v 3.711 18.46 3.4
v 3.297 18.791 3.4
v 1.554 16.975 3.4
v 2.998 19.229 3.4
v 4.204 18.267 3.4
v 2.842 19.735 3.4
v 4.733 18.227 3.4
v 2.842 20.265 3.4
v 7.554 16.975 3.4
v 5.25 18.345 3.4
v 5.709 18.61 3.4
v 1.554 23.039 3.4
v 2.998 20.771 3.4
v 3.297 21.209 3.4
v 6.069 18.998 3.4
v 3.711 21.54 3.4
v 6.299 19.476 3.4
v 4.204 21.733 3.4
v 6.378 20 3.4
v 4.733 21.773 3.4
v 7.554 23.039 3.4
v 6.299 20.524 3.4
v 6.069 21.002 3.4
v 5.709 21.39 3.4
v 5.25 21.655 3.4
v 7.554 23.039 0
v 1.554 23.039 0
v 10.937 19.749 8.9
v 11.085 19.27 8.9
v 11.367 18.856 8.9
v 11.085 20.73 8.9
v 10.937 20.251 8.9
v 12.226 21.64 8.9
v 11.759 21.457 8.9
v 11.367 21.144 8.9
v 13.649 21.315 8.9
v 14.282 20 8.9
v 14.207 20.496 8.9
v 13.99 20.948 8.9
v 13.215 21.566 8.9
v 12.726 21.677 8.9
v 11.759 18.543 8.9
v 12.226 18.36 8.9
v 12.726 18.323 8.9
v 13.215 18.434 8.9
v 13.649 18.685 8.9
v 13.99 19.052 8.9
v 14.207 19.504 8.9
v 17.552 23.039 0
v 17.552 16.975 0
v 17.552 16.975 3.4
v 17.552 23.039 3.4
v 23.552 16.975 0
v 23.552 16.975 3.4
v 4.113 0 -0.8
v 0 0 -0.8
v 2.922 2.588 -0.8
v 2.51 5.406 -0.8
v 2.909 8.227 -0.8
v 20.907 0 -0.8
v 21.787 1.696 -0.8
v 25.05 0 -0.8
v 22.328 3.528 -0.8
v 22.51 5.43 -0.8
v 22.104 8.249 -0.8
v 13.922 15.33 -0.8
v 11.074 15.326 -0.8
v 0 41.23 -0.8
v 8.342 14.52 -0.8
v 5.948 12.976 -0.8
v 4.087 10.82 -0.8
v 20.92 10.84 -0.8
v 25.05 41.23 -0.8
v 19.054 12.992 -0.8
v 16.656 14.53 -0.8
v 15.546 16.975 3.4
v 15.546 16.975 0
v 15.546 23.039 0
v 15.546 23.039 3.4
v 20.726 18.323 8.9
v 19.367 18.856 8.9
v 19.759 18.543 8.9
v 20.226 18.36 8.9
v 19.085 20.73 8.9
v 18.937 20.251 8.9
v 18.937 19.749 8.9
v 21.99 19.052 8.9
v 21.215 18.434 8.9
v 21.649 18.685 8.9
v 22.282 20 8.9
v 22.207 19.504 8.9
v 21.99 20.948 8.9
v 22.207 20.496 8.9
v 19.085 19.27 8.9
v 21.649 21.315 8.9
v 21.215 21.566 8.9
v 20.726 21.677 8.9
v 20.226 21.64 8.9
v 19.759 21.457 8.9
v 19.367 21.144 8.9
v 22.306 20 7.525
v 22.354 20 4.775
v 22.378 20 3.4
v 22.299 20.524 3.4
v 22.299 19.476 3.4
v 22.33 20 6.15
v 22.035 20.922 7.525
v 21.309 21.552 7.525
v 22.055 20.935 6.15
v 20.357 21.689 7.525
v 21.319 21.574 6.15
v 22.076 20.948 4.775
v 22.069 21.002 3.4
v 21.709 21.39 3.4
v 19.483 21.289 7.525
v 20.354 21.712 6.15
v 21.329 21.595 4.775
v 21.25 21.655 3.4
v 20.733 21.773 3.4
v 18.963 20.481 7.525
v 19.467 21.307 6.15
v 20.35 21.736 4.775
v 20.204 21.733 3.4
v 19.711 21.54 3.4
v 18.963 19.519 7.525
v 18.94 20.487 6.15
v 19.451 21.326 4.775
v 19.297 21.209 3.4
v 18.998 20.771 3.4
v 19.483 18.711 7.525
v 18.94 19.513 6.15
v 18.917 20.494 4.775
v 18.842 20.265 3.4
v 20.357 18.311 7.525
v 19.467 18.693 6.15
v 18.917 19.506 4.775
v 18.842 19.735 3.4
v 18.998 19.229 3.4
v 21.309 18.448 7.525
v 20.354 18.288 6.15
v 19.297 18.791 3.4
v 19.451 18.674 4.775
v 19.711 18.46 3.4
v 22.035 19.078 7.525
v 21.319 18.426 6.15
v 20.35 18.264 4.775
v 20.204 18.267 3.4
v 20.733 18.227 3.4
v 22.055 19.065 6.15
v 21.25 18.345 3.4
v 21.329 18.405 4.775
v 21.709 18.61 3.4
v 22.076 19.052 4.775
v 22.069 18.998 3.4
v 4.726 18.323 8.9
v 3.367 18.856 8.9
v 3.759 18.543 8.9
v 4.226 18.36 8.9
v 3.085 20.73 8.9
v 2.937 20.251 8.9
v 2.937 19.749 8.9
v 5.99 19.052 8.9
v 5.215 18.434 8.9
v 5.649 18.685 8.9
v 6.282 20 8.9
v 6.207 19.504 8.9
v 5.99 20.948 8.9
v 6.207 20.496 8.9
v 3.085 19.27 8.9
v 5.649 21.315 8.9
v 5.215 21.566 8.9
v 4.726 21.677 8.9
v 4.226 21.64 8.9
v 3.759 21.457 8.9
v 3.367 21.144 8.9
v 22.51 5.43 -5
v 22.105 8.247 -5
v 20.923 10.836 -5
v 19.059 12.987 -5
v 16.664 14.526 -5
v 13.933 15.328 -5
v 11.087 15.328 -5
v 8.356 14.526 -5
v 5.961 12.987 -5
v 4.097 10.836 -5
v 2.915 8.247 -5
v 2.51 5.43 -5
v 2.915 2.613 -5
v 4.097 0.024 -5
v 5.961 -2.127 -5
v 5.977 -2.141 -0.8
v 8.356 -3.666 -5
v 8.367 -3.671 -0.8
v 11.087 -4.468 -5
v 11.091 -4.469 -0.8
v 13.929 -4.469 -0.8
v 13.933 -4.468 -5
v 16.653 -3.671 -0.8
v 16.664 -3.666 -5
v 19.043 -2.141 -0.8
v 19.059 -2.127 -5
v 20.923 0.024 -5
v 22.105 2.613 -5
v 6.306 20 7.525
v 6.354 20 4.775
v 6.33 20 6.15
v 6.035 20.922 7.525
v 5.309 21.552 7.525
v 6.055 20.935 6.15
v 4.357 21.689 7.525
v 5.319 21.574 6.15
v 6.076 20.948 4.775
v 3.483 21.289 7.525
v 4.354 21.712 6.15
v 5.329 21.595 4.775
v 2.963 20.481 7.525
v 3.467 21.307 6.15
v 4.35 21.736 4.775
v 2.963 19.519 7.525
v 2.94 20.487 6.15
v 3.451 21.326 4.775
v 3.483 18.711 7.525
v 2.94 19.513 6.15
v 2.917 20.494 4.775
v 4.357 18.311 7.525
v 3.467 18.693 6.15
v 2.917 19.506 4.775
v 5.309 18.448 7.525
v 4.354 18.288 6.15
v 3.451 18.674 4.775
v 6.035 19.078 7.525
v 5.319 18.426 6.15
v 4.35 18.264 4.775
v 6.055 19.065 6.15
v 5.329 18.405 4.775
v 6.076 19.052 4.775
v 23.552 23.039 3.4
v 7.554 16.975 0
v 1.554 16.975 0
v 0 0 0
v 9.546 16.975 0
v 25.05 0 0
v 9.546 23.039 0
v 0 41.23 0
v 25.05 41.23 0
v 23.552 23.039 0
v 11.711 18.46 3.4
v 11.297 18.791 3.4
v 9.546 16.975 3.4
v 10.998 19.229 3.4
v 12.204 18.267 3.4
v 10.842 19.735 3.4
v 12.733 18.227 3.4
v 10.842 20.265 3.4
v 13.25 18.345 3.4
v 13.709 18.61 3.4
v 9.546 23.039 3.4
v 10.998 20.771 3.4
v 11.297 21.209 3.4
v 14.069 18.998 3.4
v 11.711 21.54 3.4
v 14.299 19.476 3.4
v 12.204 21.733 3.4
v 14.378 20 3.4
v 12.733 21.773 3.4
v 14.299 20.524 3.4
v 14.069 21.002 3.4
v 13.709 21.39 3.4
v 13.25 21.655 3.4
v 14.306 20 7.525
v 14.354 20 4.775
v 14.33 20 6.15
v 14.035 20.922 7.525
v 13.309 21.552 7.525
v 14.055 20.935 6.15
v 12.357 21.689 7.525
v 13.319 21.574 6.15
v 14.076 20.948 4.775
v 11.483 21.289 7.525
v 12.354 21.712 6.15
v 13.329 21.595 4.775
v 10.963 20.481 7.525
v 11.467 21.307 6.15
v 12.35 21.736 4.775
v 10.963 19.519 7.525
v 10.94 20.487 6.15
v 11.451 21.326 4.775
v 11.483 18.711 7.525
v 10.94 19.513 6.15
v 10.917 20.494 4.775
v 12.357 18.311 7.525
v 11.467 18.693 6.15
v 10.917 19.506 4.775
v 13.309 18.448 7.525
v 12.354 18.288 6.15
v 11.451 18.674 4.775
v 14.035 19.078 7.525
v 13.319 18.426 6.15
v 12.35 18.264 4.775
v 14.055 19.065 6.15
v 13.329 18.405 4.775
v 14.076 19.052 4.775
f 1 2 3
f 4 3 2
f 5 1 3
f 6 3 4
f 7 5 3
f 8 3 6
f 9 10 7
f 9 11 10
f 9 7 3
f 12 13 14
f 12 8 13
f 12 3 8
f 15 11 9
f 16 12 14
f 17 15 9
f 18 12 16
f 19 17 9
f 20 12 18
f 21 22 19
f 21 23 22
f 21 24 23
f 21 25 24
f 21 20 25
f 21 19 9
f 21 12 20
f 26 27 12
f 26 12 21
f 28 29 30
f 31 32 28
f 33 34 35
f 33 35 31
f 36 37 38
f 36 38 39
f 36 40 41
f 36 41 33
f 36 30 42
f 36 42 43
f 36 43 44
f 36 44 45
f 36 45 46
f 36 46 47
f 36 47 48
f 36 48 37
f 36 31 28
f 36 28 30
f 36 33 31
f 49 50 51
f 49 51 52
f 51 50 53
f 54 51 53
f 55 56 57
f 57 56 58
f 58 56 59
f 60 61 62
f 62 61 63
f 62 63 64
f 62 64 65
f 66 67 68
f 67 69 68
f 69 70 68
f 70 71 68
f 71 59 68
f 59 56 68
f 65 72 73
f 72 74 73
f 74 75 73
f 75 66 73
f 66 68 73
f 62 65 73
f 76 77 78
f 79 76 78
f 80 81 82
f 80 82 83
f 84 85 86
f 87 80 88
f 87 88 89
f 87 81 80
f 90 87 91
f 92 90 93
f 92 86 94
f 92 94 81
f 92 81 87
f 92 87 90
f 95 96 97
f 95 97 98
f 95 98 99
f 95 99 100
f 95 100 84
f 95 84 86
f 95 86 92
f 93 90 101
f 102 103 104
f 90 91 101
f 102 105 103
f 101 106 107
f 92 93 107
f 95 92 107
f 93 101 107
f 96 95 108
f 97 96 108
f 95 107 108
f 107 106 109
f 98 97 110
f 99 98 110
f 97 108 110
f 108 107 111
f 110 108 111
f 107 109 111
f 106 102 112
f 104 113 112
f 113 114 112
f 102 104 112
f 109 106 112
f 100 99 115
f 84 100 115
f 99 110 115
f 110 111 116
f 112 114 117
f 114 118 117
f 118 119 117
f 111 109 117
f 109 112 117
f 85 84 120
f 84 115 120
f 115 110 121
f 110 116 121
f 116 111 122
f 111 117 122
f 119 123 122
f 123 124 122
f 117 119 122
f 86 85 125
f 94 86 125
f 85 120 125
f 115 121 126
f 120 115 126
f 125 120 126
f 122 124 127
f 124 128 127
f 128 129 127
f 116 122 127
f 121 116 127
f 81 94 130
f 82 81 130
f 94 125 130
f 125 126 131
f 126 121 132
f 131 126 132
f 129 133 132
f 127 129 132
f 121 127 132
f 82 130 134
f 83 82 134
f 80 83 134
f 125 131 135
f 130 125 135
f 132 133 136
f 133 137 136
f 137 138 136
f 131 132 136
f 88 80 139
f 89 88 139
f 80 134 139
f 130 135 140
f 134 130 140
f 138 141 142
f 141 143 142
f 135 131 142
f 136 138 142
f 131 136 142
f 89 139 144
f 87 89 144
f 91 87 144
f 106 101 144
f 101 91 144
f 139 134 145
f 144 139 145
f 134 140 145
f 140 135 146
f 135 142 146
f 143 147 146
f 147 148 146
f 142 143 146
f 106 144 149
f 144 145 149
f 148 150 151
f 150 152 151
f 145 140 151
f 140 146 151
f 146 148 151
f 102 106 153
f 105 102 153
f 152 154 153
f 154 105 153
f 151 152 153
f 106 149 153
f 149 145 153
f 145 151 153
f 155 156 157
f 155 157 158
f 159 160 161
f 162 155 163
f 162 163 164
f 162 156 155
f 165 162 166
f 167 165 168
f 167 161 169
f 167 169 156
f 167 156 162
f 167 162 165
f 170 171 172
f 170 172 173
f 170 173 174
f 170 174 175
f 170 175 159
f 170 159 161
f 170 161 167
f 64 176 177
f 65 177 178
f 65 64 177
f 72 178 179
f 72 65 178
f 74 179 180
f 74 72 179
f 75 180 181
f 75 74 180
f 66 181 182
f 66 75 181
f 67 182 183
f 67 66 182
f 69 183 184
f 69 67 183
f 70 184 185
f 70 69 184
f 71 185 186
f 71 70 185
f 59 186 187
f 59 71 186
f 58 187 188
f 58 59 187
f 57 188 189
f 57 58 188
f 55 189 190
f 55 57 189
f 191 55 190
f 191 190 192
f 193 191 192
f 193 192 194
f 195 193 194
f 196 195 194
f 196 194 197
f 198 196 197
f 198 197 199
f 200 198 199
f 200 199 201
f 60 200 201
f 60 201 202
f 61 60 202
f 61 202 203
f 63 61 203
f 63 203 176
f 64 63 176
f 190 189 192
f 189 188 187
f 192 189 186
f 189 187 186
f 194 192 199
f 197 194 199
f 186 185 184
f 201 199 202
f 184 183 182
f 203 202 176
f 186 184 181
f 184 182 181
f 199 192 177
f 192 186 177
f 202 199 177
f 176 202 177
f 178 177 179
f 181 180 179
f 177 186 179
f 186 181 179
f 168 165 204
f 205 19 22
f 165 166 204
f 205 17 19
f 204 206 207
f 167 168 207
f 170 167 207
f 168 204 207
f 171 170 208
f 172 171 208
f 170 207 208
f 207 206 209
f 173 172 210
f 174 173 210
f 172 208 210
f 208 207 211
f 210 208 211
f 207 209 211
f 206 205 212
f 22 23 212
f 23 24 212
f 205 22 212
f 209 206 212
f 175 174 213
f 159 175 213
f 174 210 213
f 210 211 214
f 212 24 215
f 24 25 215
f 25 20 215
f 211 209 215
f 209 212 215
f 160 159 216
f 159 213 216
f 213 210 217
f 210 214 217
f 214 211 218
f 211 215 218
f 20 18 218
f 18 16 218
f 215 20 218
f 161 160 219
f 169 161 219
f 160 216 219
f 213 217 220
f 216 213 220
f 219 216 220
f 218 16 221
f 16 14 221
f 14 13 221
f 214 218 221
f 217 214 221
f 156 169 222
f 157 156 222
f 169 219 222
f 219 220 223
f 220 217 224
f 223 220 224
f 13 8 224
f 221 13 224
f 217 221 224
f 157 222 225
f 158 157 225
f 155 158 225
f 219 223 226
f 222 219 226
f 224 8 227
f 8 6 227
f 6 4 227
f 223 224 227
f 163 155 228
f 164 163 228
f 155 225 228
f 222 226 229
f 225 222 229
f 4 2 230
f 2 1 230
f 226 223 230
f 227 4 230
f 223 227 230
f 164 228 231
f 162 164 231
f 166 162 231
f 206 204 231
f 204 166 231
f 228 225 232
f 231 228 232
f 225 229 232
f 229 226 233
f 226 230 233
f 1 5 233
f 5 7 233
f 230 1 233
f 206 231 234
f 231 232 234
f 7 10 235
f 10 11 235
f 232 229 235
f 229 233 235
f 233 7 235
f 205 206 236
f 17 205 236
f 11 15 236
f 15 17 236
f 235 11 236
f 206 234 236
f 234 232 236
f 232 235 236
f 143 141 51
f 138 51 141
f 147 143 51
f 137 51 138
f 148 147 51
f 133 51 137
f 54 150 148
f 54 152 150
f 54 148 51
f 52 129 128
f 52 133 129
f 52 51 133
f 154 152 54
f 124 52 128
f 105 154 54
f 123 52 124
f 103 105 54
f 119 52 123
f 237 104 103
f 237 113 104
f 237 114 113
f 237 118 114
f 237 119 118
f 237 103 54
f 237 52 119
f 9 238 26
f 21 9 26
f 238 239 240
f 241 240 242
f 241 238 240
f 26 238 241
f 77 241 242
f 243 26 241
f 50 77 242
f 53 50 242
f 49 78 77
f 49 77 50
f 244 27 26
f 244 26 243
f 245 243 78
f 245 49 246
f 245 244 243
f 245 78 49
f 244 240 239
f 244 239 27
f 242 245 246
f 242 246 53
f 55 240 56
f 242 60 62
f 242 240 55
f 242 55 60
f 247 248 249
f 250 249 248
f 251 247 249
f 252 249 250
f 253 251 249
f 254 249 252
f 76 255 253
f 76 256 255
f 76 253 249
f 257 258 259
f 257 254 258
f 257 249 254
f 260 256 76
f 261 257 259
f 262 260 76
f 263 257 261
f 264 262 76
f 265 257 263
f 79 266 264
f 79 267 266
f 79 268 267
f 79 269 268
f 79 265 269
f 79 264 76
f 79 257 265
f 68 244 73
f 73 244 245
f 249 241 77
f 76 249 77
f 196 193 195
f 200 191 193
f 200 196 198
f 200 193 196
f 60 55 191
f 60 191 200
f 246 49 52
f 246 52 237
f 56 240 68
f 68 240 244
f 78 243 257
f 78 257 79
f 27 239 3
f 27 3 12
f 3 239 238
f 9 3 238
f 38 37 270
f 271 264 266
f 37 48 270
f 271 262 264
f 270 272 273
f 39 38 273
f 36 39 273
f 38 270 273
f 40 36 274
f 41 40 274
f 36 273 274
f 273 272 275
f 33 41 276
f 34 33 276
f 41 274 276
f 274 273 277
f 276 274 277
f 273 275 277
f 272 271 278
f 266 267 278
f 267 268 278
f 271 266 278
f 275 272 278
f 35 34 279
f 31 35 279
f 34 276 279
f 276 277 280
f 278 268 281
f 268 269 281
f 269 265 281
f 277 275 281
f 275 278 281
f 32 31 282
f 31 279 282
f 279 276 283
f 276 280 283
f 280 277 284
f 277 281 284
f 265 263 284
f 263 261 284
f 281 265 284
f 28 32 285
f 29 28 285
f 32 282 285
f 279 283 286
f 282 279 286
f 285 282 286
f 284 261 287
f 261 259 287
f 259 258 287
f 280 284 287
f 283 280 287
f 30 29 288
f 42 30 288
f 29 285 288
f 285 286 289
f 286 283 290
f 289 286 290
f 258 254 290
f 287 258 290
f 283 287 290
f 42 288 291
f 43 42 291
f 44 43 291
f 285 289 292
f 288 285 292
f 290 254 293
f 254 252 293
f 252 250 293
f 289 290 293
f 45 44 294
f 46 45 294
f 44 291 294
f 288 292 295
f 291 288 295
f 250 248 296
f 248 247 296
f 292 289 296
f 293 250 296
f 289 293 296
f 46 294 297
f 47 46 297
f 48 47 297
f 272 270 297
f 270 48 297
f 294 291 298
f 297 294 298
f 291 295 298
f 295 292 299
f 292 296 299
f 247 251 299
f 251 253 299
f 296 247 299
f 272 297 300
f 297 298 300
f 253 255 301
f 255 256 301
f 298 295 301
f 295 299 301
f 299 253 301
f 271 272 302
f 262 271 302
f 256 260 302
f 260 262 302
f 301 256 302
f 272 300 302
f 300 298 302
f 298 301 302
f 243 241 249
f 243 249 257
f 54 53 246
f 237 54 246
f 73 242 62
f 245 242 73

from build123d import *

# Parameters (mm, degrees)
SKETCH_20_W                   = 25.05
SKETCH_20_H                   = 41.23
BOSS_EXTRUDE1_DEPTH           = 0.8
SKETCH13_W                    = 6
SKETCH13_H                    = 6.063806384
BOSS_EXTRUDE2_DEPTH           = 3.4
SKETCH14_R                    = 1.778
BOSS_EXTRUDE3_DEPTH           = 5.5
BOSS_EXTRUDE3_DRAFT           = 1
BOSS_EXTRUDE3_PROFILE_2_DEPTH = 5.5
BOSS_EXTRUDE3_PROFILE_2_DRAFT = 1
BOSS_EXTRUDE3_PROFILE_3_DEPTH = 5.5
BOSS_EXTRUDE3_PROFILE_3_DRAFT = 1
SKETCH15_R                    = 10
BOSS_EXTRUDE4_DEPTH           = 4.2


with BuildPart() as part:
    # Sketch 20 → Boss-Extrude1 (new body)
    with BuildSketch(Plane.XY):
        with Locations((12.525, 20.615)):
            Rectangle(SKETCH_20_W, SKETCH_20_H)
    extrude(amount=-BOSS_EXTRUDE1_DEPTH)

    # Sketch13 → Boss-Extrude2 (add)
    with BuildSketch(Plane.XY):
        with Locations((4.55409918, 20.007058513)):
            Rectangle(SKETCH13_W, SKETCH13_H)
        with Locations((12.546384712, 20.007058513)):
            Rectangle(SKETCH13_W, SKETCH13_H)
        with Locations((20.551668538, 20.007058513)):
            Rectangle(SKETCH13_W, SKETCH13_H)
    extrude(amount=BOSS_EXTRUDE2_DEPTH)


with BuildPart() as boss_extrude3_tool:
    # Sketch14 → Boss-Extrude3 (with draft: the straight prism first)
    with BuildSketch(Plane.XY.offset(3.4)):
        with Locations((4.6, 20)):
            Circle(SKETCH14_R)
    extrude(amount=BOSS_EXTRUDE3_DEPTH)
    # Boss-Extrude3: the draft: its side faces are tilted about the plane it starts from
    boss_extrude3_sides = [boss_extrude3_tool.faces().sort_by_distance(p)[0] for p in [
        (2.822, 20, 6.15),
    ]]
    draft(boss_extrude3_sides, Plane.XY.offset(3.4), BOSS_EXTRUDE3_DRAFT)


with BuildPart() as part_1:
    add(part.part)

    # Boss-Extrude3: add boss_extrude3_tool
    add(boss_extrude3_tool.part)


with BuildPart() as boss_extrude3_profile_2_tool:
    # Sketch14 → Boss-Extrude3 profile 2 (with draft: the straight prism first)
    with BuildSketch(Plane.XY.offset(3.4)):
        with Locations((12.6, 20)):
            Circle(SKETCH14_R)
    extrude(amount=BOSS_EXTRUDE3_PROFILE_2_DEPTH)
    # Boss-Extrude3 profile 2: the draft: its side faces are tilted about the plane it starts from
    boss_extrude3_profile_2_sides = [boss_extrude3_profile_2_tool.faces().sort_by_distance(p)[0] for p in [
        (10.822, 20, 6.15),
    ]]
    draft(boss_extrude3_profile_2_sides, Plane.XY.offset(3.4), BOSS_EXTRUDE3_PROFILE_2_DRAFT)


with BuildPart() as part_2:
    add(part_1.part)

    # Boss-Extrude3 profile 2: add boss_extrude3_profile_2_tool
    add(boss_extrude3_profile_2_tool.part)


with BuildPart() as boss_extrude3_profile_3_tool:
    # Sketch14 → Boss-Extrude3 profile 3 (with draft: the straight prism first)
    with BuildSketch(Plane.XY.offset(3.4)):
        with Locations((20.6, 20)):
            Circle(SKETCH14_R)
    extrude(amount=BOSS_EXTRUDE3_PROFILE_3_DEPTH)
    # Boss-Extrude3 profile 3: the draft: its side faces are tilted about the plane it starts from
    boss_extrude3_profile_3_sides = [boss_extrude3_profile_3_tool.faces().sort_by_distance(p)[0] for p in [
        (18.822, 20, 6.15),
    ]]
    draft(boss_extrude3_profile_3_sides, Plane.XY.offset(3.4), BOSS_EXTRUDE3_PROFILE_3_DRAFT)


with BuildPart() as part_3:
    add(part_2.part)

    # Boss-Extrude3 profile 3: add boss_extrude3_profile_3_tool
    add(boss_extrude3_profile_3_tool.part)

    # Sketch15 → Boss-Extrude4 (add)
    with BuildSketch(Plane.XY.offset(-0.8)):
        with Locations((12.51, 5.43)):
            Circle(SKETCH15_R)
    extrude(amount=-BOSS_EXTRUDE4_DEPTH)


solid = part_3.part
